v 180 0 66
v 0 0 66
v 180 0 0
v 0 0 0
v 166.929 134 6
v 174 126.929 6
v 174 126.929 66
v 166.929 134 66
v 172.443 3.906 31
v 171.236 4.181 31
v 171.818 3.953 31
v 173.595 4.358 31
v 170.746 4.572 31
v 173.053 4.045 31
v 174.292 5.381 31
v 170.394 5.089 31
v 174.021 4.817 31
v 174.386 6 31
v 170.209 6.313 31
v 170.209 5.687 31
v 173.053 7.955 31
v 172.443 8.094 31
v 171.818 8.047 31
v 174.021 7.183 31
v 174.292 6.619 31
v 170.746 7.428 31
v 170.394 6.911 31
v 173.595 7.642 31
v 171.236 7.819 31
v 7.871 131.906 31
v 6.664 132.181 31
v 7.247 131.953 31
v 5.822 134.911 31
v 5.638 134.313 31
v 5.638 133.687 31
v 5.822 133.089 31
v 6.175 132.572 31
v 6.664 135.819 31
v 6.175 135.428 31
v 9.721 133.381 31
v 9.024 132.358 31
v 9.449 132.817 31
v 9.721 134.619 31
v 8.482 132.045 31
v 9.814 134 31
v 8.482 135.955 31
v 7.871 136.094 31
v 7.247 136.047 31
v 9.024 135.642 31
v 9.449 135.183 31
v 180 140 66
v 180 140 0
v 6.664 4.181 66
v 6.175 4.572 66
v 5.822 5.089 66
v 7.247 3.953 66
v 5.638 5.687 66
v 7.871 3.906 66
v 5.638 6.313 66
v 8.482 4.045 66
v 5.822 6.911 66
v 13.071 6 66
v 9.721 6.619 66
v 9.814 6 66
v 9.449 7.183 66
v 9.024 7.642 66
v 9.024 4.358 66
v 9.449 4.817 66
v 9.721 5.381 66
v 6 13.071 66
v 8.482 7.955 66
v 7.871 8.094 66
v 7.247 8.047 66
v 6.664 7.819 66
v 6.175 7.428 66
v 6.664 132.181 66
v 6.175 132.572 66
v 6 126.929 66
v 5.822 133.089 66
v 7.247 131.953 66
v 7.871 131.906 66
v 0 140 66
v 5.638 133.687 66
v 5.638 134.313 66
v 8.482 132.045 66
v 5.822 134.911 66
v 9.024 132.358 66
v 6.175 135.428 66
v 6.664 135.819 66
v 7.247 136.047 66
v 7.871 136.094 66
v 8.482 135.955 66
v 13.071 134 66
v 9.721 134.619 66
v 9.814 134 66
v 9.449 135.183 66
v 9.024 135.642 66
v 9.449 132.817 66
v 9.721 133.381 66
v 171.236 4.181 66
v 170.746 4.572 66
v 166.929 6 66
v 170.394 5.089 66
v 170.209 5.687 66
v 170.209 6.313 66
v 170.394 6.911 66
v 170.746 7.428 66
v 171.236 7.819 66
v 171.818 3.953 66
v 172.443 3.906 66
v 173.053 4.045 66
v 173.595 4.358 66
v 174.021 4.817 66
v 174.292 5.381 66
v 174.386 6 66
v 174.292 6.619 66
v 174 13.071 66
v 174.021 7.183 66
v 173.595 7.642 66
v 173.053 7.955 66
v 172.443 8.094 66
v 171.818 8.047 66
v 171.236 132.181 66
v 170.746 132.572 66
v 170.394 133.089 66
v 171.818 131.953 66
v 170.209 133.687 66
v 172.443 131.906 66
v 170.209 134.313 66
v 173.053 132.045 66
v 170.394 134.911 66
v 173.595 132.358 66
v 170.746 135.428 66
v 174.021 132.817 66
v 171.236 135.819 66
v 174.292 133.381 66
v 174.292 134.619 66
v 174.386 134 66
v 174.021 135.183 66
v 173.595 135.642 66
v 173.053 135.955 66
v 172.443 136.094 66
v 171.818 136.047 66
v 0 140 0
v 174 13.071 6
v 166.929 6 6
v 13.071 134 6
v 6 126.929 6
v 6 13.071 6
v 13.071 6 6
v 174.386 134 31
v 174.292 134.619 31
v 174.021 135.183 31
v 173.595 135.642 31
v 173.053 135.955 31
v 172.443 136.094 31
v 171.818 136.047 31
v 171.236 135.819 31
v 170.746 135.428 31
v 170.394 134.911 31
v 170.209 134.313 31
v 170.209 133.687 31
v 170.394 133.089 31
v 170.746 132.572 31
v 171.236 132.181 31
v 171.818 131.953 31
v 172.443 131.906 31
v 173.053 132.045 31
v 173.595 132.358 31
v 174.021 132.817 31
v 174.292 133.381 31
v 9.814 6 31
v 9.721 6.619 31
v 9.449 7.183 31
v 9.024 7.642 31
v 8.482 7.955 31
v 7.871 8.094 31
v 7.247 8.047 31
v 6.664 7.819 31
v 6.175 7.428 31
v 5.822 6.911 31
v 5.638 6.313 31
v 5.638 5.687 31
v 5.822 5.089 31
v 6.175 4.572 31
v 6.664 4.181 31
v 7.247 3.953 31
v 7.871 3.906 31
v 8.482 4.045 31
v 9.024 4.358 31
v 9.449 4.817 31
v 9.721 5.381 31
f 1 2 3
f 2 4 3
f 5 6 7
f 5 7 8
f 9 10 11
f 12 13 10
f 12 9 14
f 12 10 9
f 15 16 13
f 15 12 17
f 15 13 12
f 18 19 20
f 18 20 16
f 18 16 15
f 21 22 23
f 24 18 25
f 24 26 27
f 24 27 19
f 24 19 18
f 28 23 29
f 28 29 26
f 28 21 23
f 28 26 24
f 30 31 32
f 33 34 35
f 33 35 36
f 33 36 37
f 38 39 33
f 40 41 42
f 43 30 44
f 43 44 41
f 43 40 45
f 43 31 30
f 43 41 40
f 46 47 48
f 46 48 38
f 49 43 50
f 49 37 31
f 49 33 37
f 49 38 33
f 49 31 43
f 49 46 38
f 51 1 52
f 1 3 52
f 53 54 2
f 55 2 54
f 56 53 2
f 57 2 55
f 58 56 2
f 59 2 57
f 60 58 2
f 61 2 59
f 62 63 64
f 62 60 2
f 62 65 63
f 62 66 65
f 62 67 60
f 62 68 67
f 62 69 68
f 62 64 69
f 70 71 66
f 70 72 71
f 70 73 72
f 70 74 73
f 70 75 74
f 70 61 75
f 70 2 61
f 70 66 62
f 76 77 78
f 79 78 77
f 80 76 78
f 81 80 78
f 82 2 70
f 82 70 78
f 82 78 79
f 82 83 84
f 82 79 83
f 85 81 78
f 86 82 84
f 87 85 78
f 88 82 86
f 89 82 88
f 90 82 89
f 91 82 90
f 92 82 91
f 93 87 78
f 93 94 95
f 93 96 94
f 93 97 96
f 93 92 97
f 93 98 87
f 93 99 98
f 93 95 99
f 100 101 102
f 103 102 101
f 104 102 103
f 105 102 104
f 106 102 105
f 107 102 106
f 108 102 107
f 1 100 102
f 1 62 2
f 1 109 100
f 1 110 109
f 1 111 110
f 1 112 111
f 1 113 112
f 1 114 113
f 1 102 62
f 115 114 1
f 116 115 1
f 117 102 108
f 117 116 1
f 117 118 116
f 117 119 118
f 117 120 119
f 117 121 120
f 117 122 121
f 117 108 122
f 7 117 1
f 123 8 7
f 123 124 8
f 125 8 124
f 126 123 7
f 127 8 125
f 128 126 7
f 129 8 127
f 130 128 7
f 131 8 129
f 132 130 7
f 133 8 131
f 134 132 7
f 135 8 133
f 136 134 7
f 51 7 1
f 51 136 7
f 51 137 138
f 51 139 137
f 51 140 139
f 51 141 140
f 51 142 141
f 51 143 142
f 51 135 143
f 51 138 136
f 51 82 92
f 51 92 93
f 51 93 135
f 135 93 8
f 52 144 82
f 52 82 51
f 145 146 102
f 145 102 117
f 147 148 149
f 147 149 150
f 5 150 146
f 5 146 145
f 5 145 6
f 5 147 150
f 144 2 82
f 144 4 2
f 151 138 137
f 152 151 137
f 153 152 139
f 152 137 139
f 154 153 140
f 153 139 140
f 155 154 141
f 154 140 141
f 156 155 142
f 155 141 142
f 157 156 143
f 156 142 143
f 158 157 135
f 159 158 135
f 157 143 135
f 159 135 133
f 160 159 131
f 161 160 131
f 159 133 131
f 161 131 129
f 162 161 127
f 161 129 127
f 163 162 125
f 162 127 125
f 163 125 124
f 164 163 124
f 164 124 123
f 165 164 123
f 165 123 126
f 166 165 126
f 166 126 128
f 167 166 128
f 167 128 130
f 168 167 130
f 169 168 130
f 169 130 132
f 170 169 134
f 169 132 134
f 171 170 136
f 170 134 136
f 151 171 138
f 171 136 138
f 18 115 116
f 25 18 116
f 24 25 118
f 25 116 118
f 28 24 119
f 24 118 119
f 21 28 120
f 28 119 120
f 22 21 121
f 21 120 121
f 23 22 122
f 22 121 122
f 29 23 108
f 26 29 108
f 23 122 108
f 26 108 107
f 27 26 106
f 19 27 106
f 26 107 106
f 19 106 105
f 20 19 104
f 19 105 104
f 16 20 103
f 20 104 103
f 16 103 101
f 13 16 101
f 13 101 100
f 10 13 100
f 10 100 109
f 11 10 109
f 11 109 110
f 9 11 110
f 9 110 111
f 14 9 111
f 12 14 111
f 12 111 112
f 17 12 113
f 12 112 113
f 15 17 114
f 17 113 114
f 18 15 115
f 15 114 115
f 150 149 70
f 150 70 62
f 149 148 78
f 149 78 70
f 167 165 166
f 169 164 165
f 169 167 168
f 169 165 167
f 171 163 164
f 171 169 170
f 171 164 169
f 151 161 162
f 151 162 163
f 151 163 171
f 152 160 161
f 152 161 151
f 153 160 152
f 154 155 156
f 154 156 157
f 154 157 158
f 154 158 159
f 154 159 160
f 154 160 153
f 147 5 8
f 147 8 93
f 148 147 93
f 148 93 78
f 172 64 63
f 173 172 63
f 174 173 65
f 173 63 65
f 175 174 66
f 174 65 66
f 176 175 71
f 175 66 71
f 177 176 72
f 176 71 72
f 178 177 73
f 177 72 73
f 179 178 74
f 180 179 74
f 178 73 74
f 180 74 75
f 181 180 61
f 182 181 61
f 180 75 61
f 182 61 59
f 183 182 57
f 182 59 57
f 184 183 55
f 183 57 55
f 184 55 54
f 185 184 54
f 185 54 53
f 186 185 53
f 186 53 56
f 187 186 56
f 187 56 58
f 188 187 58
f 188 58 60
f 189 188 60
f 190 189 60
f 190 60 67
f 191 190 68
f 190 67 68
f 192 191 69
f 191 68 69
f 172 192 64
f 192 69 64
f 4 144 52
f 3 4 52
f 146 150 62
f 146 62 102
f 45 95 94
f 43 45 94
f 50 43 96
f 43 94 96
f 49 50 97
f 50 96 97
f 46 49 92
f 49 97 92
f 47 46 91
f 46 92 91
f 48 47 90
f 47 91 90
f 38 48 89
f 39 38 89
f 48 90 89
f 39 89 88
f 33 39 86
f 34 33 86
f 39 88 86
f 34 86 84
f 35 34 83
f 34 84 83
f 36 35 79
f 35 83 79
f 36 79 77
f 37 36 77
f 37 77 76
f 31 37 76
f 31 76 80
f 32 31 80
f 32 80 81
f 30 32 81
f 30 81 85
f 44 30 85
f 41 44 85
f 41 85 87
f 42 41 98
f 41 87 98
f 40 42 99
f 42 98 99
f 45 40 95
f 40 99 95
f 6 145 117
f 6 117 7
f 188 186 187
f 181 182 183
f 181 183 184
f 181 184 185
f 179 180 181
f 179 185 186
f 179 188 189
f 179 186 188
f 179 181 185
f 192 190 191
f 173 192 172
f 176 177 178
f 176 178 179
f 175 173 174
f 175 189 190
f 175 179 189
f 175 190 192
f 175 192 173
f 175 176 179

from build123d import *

# Parameters (mm, degrees)
BOX_W           = 180
BOX_H           = 140
BOX_DEPTH       = 6
SKETCH_W        = 180
SKETCH_H        = 140
PAD_DEPTH       = 60
SKETCH007_R     = 2.1
POCKET001_DEPTH = 35


with BuildPart() as part:
    # Box → Box (new body)
    with BuildSketch(Plane.XY):
        with Locations((90, 70)):
            Rectangle(BOX_W, BOX_H)
    extrude(amount=BOX_DEPTH)

    # Sketch → Pad (new body)
    with BuildSketch(Plane.XY.offset(6)):
        with Locations((90, 70)):
            Rectangle(SKETCH_W, SKETCH_H)
        Polygon((166.928932, 134), (13.071068, 134), (6, 126.928932), (6, 13.071068), (13.071068, 6), (166.928932, 6), (174, 13.071068), (174, 126.928932), align=None, mode=Mode.SUBTRACT)
    extrude(amount=PAD_DEPTH)

    # Sketch007 → Pocket001 (cut)
    with BuildSketch(Plane.XY.offset(66)):
        with Locations((172.285714, 6)):
            Circle(SKETCH007_R)
        with Locations((172.285714, 134)):
            Circle(SKETCH007_R)
        with Locations((7.714286, 134)):
            Circle(SKETCH007_R)
        with Locations((7.714286, 6)):
            Circle(SKETCH007_R)
    extrude(amount=-POCKET001_DEPTH, mode=Mode.SUBTRACT)


solid = part.part
